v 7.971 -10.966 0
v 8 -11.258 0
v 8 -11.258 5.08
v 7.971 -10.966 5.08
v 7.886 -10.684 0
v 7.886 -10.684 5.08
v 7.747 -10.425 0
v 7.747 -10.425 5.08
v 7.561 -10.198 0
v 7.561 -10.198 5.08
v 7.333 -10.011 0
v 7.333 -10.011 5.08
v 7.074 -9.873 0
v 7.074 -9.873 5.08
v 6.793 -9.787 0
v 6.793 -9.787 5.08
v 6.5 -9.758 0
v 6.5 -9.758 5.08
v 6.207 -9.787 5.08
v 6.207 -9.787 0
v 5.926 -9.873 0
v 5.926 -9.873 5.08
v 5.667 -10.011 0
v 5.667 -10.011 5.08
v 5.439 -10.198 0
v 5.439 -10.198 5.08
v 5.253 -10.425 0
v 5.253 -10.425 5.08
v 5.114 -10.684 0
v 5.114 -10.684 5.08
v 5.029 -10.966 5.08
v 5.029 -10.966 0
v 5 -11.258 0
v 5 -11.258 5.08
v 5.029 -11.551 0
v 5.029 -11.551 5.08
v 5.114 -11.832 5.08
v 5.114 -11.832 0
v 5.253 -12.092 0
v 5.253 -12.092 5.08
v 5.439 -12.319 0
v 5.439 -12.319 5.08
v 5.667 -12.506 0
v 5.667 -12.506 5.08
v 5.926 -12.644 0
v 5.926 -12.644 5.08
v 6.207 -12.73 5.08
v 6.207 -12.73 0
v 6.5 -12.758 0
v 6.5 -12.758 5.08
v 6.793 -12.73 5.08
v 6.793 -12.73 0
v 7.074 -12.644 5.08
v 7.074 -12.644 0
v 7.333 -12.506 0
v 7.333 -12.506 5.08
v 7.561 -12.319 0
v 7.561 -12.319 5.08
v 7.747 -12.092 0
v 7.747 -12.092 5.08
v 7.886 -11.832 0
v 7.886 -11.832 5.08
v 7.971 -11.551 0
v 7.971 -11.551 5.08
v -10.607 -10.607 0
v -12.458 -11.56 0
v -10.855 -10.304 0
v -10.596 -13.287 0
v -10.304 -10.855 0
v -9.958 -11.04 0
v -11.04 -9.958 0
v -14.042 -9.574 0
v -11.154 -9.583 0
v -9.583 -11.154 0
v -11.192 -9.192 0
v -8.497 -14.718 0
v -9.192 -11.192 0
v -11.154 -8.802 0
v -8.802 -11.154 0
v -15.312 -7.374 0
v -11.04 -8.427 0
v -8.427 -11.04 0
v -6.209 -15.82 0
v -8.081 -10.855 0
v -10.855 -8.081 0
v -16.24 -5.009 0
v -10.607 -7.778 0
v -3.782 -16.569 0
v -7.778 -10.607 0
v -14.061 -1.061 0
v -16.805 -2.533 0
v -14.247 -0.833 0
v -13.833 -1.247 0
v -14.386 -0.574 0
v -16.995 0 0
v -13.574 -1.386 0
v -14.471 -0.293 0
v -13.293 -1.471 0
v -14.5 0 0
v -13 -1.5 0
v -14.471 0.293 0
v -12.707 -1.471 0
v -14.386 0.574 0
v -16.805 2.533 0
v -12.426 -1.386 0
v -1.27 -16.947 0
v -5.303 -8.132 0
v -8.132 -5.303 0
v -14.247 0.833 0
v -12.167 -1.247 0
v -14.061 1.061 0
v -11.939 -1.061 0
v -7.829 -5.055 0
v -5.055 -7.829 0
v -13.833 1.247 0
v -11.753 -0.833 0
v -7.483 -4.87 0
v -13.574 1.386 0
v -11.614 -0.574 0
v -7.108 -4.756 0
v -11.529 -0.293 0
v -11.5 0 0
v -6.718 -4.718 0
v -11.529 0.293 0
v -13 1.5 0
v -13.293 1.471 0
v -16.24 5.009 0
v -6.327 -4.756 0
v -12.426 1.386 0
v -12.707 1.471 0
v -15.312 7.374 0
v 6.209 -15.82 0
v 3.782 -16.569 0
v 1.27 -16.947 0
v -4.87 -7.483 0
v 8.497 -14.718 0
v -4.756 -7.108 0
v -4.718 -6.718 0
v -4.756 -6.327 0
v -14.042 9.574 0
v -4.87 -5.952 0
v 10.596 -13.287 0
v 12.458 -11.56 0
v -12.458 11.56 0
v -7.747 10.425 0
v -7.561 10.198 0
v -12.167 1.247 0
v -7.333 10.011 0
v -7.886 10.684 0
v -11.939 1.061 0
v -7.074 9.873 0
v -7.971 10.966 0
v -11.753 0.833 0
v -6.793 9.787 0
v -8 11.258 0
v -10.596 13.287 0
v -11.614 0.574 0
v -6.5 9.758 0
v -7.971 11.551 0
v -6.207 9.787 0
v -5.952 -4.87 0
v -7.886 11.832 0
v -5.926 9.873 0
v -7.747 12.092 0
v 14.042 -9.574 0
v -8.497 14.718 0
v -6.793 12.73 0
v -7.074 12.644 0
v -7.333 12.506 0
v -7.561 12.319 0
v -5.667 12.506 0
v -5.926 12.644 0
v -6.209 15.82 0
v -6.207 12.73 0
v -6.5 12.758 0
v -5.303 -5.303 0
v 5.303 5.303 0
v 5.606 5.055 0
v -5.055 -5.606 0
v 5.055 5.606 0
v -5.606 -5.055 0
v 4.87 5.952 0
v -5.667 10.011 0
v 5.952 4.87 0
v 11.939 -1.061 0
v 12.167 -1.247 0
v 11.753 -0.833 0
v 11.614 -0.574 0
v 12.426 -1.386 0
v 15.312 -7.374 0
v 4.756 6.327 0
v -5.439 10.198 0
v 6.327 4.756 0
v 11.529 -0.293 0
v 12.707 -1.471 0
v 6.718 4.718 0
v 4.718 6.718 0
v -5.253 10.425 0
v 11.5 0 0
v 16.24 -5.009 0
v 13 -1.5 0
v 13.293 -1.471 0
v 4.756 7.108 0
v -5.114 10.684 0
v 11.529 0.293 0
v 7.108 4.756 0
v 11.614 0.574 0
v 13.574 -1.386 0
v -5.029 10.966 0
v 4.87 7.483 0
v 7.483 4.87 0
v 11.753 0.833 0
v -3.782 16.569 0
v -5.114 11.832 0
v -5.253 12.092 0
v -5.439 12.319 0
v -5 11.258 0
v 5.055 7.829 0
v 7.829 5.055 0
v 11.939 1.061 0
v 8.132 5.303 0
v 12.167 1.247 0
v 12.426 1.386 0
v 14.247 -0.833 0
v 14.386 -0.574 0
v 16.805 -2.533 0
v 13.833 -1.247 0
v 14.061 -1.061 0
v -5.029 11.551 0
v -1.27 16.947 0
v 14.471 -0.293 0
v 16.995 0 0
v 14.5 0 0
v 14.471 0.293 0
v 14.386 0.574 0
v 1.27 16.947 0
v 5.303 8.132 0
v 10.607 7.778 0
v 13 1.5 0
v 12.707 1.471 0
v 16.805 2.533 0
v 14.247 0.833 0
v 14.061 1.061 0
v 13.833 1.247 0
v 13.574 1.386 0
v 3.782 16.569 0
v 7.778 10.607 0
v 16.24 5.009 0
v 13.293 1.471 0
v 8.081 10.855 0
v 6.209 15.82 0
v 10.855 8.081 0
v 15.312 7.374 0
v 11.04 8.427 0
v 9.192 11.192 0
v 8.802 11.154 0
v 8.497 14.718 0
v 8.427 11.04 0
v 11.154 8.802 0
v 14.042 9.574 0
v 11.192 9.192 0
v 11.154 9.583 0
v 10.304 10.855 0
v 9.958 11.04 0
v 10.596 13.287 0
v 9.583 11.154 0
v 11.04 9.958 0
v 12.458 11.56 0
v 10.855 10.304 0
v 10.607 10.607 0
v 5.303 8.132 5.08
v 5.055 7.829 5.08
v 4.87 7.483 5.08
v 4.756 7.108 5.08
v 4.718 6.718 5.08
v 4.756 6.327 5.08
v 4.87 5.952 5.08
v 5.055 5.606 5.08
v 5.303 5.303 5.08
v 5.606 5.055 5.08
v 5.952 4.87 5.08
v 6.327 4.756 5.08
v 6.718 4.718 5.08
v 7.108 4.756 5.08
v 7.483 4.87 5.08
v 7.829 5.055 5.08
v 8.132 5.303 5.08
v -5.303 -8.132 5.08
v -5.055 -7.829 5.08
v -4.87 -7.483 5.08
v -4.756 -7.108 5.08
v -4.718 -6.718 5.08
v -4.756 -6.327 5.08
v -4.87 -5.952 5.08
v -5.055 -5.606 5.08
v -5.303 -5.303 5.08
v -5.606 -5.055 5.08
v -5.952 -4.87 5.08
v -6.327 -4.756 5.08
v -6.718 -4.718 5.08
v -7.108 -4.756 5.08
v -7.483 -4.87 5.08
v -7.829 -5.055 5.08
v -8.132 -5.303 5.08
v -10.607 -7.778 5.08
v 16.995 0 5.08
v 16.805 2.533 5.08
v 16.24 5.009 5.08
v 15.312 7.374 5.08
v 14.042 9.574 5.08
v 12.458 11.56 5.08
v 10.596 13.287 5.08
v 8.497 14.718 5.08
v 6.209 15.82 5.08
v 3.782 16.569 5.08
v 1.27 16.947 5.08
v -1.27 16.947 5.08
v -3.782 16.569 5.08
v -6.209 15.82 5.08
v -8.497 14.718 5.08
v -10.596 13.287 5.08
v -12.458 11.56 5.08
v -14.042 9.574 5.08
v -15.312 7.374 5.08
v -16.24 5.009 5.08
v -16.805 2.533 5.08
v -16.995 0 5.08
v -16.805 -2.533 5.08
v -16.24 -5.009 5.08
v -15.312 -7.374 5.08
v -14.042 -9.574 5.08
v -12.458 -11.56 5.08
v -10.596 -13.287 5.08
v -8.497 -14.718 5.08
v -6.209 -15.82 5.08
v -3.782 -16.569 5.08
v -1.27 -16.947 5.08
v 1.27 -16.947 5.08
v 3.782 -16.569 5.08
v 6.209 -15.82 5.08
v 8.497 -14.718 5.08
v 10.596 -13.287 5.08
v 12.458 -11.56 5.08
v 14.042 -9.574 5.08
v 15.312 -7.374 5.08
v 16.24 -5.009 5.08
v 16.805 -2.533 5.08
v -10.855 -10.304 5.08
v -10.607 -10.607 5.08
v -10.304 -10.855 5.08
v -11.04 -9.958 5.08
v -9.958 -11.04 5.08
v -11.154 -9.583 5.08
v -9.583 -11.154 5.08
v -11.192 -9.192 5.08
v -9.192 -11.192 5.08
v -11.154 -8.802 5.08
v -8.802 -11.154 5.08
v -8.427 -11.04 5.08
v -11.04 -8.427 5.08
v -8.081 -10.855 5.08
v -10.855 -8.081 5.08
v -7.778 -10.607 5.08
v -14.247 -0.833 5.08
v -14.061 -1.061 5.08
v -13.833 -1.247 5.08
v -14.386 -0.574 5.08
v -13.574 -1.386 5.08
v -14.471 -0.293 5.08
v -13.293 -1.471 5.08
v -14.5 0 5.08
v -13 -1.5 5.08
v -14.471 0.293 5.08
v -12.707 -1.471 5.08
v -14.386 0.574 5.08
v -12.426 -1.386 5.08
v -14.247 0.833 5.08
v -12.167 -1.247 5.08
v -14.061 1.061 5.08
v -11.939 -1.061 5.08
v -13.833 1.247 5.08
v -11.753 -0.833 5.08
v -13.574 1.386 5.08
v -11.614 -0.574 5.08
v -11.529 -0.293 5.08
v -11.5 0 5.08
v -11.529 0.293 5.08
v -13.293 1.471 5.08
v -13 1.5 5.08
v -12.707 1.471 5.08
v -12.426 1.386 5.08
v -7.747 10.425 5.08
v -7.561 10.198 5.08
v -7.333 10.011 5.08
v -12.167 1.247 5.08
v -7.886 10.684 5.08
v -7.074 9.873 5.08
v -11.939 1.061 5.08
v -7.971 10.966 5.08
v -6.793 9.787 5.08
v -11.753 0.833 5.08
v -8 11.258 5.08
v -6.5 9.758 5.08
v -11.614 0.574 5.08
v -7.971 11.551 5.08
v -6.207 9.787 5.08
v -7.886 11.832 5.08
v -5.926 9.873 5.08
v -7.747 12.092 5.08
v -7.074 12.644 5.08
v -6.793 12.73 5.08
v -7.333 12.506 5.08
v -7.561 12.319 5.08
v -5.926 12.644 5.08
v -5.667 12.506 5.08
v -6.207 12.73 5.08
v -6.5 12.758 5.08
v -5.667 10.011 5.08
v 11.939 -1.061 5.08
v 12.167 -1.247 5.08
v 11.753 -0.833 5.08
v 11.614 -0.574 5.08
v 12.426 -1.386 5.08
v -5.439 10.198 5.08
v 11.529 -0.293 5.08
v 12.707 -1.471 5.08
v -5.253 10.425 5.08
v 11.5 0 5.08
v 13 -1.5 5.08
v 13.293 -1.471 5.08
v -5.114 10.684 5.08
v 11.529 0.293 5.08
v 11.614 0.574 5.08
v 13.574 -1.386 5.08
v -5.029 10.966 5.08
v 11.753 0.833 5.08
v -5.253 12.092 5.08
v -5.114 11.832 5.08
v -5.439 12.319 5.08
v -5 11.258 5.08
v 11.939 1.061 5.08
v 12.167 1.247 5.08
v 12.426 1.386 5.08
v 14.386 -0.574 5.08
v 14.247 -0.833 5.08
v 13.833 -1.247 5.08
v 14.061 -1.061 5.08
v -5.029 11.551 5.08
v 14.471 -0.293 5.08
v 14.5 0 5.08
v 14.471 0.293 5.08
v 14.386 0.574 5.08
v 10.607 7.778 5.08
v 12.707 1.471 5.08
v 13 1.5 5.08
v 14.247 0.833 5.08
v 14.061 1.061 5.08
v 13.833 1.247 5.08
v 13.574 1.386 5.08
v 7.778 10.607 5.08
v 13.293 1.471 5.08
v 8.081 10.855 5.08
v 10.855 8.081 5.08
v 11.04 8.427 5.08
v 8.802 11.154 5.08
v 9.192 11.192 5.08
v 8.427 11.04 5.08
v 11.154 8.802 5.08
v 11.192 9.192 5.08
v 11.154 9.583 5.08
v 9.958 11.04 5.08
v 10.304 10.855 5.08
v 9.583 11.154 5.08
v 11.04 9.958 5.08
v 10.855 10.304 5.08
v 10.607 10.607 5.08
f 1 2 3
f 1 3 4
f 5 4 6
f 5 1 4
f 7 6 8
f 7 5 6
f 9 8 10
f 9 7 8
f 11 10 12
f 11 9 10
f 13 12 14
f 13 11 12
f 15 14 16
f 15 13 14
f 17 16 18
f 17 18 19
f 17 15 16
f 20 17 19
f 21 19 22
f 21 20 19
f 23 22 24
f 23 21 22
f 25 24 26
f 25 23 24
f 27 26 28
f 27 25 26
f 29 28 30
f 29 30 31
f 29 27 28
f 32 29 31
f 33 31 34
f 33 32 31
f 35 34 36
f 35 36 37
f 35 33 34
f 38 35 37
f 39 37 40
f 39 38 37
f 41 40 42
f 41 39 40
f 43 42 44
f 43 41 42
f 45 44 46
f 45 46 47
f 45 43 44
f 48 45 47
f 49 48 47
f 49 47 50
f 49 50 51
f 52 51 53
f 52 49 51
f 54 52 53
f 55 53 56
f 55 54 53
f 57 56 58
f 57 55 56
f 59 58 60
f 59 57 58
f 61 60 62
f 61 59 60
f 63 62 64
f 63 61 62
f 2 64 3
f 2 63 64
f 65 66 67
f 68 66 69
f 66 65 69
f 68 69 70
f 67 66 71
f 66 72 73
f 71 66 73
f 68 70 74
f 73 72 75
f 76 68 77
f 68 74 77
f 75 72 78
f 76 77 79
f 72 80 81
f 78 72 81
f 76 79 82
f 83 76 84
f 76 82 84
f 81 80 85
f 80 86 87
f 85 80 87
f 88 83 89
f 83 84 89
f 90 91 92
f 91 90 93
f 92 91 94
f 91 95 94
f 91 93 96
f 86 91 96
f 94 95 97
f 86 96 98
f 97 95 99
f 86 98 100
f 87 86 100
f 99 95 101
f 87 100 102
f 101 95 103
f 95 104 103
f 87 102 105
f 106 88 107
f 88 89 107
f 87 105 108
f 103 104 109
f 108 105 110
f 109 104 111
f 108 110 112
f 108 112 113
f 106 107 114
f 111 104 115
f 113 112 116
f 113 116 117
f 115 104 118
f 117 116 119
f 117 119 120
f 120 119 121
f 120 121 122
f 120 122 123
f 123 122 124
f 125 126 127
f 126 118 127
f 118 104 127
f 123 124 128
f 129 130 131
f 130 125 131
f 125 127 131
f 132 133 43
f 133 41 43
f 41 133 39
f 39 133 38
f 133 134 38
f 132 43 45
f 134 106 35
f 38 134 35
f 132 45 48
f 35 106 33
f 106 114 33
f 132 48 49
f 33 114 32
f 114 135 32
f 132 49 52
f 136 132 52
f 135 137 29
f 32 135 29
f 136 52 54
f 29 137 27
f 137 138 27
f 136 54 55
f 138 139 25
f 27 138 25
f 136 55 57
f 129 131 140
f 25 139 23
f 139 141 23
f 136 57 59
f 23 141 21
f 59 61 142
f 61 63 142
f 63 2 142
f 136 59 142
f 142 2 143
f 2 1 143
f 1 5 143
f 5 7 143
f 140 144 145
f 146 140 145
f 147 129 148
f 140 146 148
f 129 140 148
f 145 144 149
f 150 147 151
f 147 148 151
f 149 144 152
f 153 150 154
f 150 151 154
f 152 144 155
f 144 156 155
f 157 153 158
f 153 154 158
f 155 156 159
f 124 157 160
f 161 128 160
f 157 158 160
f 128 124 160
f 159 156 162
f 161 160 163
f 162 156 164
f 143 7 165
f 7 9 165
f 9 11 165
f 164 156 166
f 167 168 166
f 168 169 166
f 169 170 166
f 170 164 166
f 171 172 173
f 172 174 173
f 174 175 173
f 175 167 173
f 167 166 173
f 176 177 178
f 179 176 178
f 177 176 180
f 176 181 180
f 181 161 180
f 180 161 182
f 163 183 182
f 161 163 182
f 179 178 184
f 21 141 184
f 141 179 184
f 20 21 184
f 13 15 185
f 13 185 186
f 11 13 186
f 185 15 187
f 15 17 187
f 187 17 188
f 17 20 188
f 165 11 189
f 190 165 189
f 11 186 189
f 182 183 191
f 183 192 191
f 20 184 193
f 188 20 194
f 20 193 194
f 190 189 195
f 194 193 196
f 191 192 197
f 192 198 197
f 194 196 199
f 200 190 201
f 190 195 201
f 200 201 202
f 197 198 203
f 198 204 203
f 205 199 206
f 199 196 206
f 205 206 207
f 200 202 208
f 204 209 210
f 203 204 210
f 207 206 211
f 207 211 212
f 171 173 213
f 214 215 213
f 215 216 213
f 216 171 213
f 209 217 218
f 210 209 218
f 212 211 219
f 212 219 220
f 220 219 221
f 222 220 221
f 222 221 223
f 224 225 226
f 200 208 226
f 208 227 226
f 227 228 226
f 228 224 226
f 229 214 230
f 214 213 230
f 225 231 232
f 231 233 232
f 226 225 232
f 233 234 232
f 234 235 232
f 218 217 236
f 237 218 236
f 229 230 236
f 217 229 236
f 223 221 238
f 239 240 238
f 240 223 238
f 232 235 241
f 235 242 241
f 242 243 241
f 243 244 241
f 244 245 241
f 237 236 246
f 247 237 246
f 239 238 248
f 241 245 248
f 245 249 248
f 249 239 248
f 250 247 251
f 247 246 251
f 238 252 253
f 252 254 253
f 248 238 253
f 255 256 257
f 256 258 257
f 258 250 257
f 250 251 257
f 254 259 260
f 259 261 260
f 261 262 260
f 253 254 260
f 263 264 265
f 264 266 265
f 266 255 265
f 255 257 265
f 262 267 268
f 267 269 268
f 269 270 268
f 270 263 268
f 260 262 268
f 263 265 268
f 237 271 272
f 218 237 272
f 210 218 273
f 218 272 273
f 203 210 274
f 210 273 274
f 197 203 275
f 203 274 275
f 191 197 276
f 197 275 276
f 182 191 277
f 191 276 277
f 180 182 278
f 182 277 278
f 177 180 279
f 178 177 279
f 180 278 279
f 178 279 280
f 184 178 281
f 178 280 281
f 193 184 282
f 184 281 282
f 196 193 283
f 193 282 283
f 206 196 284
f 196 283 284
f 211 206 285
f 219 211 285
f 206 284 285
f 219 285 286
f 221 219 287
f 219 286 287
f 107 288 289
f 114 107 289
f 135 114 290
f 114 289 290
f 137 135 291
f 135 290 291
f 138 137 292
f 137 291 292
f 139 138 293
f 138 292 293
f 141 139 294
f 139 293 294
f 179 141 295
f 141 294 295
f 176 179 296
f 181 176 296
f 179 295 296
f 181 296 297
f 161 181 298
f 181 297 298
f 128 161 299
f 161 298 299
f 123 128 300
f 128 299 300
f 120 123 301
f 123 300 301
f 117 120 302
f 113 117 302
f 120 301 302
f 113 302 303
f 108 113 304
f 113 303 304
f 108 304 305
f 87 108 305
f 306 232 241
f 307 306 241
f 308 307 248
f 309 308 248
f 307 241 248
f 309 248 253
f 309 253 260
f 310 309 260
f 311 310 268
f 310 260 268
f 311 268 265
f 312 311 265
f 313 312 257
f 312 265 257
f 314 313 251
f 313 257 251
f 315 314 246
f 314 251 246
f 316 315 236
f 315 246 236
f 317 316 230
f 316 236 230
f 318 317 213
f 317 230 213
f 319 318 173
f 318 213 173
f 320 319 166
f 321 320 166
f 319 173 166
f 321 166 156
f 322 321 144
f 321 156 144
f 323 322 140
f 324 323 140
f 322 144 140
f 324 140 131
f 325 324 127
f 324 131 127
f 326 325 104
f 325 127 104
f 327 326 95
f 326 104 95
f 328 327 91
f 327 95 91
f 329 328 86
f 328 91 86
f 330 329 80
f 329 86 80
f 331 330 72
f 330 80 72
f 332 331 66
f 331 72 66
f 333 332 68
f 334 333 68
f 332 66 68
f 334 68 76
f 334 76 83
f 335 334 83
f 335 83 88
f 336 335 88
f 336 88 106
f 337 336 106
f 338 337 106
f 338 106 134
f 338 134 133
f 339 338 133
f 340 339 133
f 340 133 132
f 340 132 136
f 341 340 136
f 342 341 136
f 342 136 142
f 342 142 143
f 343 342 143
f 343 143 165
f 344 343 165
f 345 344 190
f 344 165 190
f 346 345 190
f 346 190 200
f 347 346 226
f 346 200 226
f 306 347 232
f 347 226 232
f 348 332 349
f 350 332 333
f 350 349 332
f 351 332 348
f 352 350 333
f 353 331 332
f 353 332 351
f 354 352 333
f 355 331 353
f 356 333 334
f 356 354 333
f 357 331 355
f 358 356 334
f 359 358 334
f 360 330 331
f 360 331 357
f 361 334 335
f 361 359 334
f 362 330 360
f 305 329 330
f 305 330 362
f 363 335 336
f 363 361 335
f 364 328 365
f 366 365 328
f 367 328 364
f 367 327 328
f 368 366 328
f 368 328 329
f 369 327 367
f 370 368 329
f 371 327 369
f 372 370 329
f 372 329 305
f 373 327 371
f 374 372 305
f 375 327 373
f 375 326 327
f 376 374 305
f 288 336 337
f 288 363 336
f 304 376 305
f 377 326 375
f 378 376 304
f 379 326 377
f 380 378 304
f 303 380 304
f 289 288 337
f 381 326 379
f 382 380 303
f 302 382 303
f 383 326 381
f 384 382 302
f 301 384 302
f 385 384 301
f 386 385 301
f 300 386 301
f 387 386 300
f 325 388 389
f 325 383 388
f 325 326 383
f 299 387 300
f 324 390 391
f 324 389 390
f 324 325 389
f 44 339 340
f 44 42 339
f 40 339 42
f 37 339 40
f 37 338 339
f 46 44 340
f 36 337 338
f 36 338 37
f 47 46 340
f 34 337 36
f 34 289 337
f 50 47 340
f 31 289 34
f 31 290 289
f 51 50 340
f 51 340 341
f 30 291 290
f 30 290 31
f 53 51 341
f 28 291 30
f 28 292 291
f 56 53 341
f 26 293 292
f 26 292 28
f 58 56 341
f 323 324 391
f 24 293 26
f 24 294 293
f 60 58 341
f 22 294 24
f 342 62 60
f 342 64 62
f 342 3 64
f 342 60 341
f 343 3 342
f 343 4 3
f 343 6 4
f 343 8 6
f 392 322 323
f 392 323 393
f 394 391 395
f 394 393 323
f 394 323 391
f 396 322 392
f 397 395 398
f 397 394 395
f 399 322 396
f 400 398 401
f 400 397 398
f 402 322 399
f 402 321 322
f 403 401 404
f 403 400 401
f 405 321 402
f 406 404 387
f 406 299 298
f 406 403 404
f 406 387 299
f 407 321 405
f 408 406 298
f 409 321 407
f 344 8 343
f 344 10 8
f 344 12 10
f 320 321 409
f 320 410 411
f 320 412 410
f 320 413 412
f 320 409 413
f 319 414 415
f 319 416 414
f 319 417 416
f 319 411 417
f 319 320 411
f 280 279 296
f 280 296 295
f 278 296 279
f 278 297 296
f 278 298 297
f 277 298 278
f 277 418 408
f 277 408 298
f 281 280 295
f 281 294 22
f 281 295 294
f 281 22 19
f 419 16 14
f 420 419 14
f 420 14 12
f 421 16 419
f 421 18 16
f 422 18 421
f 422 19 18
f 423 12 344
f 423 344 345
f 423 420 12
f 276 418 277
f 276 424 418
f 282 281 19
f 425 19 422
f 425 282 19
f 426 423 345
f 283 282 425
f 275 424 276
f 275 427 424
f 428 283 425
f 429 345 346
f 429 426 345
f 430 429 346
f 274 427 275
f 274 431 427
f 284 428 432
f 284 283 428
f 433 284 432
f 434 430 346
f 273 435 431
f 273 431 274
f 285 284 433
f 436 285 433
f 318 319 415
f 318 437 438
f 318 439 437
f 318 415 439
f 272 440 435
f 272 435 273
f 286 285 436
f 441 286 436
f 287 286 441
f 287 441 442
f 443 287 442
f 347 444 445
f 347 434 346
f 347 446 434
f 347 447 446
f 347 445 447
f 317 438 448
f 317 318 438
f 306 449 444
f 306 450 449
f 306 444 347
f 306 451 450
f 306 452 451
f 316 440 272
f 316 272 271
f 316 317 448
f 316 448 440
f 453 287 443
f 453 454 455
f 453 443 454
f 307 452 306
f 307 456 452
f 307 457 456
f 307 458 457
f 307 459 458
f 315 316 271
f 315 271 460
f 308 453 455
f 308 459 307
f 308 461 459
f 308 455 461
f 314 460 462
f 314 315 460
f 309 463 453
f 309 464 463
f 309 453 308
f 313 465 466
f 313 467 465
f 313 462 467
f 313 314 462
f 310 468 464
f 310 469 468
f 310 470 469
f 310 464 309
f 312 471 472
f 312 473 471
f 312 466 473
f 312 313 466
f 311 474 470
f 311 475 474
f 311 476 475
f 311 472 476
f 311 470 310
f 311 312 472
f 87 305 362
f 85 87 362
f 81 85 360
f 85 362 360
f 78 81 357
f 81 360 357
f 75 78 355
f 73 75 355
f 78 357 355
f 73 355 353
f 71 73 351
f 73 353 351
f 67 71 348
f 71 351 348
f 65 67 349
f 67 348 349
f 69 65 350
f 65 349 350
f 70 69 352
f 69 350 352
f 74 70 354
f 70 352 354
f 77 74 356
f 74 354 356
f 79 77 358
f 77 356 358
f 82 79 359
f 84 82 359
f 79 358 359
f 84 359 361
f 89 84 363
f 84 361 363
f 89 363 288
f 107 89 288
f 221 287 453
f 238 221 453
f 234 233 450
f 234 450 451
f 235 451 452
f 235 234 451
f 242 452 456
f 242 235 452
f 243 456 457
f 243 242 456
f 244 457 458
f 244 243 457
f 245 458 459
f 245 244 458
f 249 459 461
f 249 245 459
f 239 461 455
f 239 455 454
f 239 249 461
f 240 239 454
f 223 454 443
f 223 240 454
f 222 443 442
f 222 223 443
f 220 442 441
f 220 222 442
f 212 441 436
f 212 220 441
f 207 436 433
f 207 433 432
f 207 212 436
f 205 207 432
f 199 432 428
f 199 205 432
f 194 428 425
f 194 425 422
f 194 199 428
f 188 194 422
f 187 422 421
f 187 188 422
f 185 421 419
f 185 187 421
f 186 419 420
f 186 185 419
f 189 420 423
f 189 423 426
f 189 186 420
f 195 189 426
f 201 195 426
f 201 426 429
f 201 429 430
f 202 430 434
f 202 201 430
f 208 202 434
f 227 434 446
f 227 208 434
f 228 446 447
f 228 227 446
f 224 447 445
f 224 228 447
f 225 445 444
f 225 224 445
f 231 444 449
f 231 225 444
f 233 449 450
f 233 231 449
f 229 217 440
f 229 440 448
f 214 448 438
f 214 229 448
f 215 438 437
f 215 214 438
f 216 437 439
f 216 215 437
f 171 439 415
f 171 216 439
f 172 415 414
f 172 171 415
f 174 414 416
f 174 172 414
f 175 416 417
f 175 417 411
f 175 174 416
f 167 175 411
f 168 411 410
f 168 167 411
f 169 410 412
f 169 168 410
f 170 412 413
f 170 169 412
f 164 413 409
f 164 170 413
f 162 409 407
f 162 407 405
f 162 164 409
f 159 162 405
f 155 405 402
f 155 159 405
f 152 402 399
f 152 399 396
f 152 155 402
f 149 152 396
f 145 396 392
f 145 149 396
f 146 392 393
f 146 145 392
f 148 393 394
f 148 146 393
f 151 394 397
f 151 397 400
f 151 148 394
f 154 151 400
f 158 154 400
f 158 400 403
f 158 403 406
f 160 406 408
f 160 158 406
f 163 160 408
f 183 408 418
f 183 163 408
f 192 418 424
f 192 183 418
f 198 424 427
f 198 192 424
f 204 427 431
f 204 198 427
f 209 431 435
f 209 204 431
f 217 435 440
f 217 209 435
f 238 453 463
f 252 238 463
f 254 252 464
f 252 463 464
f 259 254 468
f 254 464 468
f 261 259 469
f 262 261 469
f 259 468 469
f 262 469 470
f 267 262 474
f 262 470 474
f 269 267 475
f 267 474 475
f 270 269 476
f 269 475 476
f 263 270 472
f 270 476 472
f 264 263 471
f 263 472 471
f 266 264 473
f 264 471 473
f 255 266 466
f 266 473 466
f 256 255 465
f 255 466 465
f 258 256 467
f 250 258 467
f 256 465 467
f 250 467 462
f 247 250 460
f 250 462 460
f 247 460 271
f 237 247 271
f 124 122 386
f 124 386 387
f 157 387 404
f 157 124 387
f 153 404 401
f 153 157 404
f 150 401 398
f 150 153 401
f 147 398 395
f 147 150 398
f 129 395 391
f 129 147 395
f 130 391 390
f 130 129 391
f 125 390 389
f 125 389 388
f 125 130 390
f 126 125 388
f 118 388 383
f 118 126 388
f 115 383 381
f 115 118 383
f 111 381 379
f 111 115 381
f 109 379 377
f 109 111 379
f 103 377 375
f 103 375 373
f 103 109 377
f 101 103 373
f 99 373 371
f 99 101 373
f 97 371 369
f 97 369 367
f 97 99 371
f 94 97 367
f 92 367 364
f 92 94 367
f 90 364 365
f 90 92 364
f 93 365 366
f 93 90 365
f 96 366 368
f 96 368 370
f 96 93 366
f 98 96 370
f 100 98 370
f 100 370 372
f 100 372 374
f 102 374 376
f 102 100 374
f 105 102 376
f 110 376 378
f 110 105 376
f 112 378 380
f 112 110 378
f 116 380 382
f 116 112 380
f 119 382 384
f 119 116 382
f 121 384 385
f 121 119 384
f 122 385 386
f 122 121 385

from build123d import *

# Parameters (mm, degrees)
SKETCH1_R           = 16.995
SKETCH1_R_2         = 1.5
BOSS_EXTRUDE1_DEPTH = 5.08
CUT_EXTRUDE2_DEPTH  = 10


with BuildPart() as part:
    # Sketch1 → Boss-Extrude1 (new body)
    with BuildSketch(Plane.XY):
        Circle(SKETCH1_R)
        with Locations((-6.5, -11.258330249)):
            Circle(SKETCH1_R_2, mode=Mode.SUBTRACT)
        with Locations((6.5, -11.258330249)):
            Circle(SKETCH1_R_2, mode=Mode.SUBTRACT)
        with Locations((13, 0)):
            Circle(SKETCH1_R_2, mode=Mode.SUBTRACT)
        with Locations((6.5, 11.258330249)):
            Circle(SKETCH1_R_2, mode=Mode.SUBTRACT)
        with Locations((-6.5, 11.258330249)):
            Circle(SKETCH1_R_2, mode=Mode.SUBTRACT)
        with Locations((-13, 0)):
            Circle(SKETCH1_R_2, mode=Mode.SUBTRACT)
        with Locations((6.5, 11.258330249)):
            Circle(SKETCH1_R_2)
        with Locations((-6.5, -11.258330249)):
            Circle(SKETCH1_R_2)
    extrude(amount=BOSS_EXTRUDE1_DEPTH)

    # Sketch2 → Cut-Extrude2 (cut)
    with BuildSketch(Plane.XY.offset(5.08)):
        with BuildLine():
            ThreePointArc((-5.303300859, -8.131727984), (-5.303300859, -5.303300859), (-8.131727984, -5.303300859))
            Line((-8.131727984, -5.303300859), (-10.606601718, -7.778174593))
            ThreePointArc((-10.606601718, -7.778174593), (-10.606601718, -10.606601718), (-7.778174593, -10.606601718))
            Line((-7.778174593, -10.606601718), (-5.303300859, -8.131727984))
        make_face()
        with BuildLine():
            ThreePointArc((10.606601718, 7.778174593), (10.606601718, 10.606601718), (7.778174593, 10.606601718))
            Line((7.778174593, 10.606601718), (5.303300859, 8.131727984))
            ThreePointArc((5.303300859, 8.131727984), (5.303300859, 5.303300859), (8.131727984, 5.303300859))
            Line((8.131727984, 5.303300859), (10.606601718, 7.778174593))
        make_face()
    extrude(amount=-CUT_EXTRUDE2_DEPTH, mode=Mode.SUBTRACT)


solid = part.part
